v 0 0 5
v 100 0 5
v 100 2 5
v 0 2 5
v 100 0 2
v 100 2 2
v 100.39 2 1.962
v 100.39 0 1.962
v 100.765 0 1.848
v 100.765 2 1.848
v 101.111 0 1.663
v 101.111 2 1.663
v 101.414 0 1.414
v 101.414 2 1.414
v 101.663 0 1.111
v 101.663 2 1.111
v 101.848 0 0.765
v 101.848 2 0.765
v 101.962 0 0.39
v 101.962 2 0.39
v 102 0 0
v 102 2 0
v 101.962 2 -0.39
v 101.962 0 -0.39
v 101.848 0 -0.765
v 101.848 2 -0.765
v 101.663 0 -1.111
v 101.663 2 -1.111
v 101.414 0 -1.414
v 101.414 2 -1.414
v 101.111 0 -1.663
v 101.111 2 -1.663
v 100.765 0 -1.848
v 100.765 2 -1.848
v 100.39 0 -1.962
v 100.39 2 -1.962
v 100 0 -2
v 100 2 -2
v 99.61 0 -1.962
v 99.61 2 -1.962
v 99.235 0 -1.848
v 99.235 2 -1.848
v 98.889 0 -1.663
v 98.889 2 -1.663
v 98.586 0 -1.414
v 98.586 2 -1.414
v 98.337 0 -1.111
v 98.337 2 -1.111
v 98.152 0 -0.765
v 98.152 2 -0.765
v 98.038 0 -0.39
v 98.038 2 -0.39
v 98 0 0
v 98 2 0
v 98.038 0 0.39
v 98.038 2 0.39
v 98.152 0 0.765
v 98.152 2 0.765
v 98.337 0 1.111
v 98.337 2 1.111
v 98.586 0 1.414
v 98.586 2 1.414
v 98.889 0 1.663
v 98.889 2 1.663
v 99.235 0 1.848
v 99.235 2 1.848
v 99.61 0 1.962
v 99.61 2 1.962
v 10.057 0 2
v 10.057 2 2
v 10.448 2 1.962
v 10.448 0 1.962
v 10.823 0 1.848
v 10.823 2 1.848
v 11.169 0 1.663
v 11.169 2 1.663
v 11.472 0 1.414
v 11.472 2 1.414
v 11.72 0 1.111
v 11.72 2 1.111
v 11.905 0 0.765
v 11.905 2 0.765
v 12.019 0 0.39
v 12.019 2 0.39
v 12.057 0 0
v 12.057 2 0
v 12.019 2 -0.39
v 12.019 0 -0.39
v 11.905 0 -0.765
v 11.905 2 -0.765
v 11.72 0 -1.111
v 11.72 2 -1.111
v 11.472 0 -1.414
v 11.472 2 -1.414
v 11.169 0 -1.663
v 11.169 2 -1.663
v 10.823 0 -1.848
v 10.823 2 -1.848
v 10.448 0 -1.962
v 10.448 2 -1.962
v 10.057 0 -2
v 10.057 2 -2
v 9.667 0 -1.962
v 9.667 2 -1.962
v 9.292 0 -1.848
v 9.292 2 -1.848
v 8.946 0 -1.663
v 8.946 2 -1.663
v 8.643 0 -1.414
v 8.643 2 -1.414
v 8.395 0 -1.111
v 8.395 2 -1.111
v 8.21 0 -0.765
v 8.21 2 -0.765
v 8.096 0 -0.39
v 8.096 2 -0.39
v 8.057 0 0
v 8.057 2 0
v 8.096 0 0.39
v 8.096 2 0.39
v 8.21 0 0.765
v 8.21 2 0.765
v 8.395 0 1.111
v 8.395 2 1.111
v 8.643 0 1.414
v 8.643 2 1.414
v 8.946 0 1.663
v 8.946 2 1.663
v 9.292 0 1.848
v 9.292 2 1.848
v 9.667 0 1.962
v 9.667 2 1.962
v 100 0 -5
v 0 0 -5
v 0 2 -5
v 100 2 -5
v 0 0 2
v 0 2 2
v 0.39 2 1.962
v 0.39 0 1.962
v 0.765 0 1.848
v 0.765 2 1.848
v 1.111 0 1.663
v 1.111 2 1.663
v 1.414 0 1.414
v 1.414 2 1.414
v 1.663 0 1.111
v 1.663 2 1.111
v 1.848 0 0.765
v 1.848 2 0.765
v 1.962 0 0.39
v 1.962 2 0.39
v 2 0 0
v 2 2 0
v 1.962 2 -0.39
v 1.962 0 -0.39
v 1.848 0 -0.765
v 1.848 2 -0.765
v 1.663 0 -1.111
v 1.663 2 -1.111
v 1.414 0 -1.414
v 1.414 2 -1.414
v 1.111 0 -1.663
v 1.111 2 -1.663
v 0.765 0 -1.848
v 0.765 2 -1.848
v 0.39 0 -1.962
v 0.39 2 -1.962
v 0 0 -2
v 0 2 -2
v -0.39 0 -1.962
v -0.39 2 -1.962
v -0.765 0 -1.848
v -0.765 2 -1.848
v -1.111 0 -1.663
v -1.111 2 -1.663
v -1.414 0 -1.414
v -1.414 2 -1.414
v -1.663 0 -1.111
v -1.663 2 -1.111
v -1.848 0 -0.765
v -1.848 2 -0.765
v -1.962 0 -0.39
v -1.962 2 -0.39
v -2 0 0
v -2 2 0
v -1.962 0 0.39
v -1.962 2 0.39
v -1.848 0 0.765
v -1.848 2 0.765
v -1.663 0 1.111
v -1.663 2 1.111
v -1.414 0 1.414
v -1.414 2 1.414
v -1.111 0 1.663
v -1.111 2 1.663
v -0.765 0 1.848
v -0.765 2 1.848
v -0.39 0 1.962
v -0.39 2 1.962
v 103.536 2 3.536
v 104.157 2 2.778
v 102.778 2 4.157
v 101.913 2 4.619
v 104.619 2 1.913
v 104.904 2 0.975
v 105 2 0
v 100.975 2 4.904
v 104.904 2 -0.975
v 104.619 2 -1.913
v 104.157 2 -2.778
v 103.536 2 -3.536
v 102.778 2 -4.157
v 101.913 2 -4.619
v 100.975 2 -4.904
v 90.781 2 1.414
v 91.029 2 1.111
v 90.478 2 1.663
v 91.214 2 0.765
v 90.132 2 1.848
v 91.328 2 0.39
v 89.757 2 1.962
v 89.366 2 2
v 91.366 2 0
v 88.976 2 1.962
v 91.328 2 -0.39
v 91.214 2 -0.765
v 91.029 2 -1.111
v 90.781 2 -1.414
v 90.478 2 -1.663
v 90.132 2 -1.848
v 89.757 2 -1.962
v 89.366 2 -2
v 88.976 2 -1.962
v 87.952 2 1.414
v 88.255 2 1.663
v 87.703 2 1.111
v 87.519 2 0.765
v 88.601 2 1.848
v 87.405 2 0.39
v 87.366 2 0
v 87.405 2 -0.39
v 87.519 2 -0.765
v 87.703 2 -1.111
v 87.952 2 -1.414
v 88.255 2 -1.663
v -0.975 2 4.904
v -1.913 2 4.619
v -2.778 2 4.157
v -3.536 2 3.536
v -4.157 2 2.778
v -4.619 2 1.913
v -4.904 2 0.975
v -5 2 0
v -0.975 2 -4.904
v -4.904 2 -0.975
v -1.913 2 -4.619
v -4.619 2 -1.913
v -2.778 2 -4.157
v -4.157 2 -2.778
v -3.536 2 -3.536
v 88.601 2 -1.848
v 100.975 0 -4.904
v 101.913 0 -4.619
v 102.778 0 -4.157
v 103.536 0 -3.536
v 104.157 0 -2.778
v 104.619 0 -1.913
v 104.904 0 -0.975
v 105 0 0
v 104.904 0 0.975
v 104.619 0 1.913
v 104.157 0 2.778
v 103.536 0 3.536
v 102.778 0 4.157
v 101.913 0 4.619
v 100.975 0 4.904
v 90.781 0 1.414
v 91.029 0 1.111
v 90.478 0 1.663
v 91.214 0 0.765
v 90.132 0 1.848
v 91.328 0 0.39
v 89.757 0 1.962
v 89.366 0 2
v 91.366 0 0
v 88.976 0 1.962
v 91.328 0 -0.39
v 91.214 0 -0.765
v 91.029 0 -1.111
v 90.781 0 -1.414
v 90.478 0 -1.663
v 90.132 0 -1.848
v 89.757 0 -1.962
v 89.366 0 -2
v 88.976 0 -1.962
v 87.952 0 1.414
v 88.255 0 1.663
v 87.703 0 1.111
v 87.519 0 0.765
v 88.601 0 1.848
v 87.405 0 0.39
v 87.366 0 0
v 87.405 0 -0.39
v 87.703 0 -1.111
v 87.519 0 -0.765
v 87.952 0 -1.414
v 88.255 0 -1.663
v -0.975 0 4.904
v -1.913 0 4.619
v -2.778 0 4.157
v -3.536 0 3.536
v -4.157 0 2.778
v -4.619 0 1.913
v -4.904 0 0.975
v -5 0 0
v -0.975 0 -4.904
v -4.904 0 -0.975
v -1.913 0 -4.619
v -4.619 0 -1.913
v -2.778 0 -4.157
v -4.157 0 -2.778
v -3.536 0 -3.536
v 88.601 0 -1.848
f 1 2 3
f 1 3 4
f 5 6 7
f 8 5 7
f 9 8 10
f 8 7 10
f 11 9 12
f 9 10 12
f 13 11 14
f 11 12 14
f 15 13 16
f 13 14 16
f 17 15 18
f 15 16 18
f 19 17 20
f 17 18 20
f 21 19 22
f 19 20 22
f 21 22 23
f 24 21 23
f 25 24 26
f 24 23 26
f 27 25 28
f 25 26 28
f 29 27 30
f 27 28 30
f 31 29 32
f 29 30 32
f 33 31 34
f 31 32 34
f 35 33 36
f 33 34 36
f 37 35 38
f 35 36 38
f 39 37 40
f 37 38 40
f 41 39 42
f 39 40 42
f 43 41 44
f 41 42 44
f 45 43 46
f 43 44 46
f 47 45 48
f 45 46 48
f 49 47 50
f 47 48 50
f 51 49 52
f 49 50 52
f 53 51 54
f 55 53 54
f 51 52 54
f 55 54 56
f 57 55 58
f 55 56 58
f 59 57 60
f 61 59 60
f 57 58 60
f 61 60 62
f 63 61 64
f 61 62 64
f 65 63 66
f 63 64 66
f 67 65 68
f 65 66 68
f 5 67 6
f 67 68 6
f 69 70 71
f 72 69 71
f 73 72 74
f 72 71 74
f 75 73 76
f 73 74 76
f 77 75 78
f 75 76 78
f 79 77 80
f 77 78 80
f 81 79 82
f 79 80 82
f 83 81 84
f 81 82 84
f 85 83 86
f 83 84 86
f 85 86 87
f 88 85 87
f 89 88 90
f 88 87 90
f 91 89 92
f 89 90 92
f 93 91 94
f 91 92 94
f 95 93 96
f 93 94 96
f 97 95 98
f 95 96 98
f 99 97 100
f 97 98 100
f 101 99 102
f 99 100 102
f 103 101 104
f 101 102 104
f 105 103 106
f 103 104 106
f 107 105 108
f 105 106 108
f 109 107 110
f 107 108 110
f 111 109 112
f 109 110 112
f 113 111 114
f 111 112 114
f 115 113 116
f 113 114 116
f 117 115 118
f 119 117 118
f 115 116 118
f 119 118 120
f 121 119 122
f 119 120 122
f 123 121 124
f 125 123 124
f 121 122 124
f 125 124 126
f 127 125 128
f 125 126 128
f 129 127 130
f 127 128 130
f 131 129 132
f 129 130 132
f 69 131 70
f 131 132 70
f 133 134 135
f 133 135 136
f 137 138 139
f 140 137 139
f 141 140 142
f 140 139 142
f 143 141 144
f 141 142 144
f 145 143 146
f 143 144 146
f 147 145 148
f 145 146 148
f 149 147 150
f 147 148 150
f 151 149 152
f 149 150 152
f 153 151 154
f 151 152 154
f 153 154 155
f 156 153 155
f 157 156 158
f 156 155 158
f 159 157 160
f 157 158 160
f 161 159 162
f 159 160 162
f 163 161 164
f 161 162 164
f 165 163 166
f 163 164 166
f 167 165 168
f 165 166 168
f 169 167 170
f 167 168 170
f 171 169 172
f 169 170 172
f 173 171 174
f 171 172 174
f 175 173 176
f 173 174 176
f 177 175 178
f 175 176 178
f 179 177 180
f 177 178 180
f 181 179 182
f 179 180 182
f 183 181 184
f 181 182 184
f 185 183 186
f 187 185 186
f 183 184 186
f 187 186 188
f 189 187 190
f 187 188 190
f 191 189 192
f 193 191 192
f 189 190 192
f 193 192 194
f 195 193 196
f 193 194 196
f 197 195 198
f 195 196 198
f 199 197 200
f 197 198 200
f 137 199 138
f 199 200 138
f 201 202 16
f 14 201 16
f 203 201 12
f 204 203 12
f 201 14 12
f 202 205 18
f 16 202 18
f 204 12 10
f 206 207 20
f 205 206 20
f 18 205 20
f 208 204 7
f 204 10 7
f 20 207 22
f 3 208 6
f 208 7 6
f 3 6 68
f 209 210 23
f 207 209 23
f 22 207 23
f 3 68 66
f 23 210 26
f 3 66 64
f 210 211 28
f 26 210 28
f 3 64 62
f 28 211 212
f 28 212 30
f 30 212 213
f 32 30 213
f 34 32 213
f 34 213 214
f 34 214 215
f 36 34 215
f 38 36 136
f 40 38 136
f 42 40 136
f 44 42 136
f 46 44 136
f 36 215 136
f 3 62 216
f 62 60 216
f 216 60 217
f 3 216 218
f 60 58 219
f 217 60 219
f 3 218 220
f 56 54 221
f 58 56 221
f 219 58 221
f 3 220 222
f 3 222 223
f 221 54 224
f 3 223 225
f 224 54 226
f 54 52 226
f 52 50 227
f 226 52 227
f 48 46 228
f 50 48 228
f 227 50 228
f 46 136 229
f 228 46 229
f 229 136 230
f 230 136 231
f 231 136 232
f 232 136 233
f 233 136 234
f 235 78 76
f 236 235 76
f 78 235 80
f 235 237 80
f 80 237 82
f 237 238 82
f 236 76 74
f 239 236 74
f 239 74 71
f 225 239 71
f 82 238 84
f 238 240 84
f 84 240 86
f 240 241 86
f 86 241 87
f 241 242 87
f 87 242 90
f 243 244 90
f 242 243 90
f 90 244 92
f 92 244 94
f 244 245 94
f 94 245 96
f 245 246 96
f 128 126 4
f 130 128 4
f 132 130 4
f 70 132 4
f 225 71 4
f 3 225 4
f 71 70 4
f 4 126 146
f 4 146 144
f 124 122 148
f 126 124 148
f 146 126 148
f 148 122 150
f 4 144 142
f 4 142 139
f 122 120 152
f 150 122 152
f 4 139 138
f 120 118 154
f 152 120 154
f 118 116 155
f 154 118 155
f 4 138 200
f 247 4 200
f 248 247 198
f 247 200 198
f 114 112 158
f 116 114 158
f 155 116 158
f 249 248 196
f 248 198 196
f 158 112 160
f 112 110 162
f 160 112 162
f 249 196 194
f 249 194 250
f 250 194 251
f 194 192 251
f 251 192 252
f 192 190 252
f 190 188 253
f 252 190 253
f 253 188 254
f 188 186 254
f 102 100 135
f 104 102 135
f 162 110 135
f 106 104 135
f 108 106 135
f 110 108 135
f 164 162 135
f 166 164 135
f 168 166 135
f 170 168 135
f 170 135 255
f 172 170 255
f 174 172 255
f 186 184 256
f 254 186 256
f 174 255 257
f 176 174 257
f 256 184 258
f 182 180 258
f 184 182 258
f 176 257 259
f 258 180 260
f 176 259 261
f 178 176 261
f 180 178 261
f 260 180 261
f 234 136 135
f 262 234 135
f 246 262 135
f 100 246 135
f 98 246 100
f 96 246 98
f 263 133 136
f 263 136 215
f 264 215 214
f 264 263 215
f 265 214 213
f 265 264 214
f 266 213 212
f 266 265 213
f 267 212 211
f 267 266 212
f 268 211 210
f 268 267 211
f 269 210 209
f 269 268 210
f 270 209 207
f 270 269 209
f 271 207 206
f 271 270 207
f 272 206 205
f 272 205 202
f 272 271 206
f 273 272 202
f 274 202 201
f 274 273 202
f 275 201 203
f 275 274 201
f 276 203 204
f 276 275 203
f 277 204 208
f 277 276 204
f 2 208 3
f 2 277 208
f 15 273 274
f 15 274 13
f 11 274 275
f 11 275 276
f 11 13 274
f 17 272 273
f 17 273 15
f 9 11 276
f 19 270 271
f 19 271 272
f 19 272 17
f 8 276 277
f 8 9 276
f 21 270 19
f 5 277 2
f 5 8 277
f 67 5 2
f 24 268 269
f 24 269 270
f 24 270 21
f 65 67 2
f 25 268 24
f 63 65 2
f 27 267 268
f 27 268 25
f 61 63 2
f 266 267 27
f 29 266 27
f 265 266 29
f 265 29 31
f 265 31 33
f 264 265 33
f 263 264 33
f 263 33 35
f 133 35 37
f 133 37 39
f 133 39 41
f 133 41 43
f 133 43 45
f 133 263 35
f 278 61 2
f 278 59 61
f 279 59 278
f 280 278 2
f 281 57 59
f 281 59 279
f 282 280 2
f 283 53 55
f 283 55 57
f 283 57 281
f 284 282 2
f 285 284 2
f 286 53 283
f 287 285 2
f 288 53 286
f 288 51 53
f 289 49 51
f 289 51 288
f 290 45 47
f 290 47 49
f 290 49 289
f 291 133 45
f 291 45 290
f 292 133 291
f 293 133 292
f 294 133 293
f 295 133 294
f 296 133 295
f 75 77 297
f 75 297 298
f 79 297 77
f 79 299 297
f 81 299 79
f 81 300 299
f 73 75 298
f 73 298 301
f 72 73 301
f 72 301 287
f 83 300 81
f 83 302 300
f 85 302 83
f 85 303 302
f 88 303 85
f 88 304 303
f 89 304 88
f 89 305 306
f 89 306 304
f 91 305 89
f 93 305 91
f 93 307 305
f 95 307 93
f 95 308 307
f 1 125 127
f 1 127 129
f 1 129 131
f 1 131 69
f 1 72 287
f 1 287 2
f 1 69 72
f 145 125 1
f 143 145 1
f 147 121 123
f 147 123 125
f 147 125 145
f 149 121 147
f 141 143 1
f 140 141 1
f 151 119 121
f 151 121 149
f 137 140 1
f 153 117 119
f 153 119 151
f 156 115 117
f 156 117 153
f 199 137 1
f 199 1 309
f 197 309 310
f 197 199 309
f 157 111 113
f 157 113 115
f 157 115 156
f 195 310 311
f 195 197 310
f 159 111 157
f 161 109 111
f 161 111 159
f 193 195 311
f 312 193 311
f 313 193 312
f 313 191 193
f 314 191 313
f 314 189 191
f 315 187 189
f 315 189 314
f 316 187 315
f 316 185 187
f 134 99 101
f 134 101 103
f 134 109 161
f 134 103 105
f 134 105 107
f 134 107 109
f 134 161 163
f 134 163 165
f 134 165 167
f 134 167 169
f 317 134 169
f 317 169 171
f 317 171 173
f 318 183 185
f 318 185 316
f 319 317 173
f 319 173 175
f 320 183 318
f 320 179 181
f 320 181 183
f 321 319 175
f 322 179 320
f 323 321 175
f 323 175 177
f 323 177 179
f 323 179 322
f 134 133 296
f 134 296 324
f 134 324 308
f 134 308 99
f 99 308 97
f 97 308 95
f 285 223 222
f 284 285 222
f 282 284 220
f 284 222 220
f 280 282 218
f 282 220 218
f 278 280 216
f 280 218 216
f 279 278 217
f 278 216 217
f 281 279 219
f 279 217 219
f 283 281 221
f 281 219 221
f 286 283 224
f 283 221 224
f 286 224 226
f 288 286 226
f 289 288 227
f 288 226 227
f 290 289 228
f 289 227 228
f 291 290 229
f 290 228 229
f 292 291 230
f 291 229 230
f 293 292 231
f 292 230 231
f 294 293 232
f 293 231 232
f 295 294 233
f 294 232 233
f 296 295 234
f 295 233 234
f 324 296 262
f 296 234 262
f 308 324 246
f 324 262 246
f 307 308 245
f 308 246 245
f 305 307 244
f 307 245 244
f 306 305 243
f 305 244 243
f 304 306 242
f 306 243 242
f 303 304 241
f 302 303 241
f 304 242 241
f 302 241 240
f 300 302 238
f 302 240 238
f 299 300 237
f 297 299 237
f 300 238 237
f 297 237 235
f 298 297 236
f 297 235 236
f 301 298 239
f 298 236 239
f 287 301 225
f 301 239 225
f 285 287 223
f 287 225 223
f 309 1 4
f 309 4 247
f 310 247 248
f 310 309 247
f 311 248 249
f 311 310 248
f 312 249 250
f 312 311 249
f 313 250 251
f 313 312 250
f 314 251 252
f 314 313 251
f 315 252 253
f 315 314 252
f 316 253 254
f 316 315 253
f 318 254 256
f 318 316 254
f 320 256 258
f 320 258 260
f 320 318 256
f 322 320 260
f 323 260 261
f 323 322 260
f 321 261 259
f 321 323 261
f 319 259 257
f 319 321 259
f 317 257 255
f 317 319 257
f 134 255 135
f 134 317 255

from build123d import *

# Parameters (mm, degrees)
SKETCH_1_R          = 2.3
EXTRUDE_1_DEPTH     = 2
SKETCH_2_R          = 2.445702399
SKETCH_2_R_2        = 2
EXTRUDE_2_DEPTH     = 2
SKETCH_3_R          = 2.726249273
SKETCH_3_R_2        = 2
EXTRUDE_3_DEPTH     = 2
SKETCH_4_R          = 2
CUT_EXTRUDE_1_DEPTH = 2


with BuildPart() as part:
    # 草图1 → 凸台-拉伸1 (new body)
    with BuildSketch(Plane(origin=(0, 0, 0), x_dir=(1, 0, 0), z_dir=(0, 1, 0))):
        with BuildLine():
            Line((0, 5), (100, 5))
            ThreePointArc((100, 5), (105, 0), (100, -5))
            Line((100, -5), (0, -5))
            ThreePointArc((0, -5), (-5, 0), (0, 5))
        make_face()
        with Locations(Location((0, 0, 0), (0, 0, 270))):
            Circle(SKETCH_1_R, mode=Mode.SUBTRACT)
        with Locations(Location((100, 0, 0), (0, 0, 270))):
            Circle(SKETCH_1_R, mode=Mode.SUBTRACT)
    extrude(amount=EXTRUDE_1_DEPTH)

    # 草图2 → 凸台-拉伸2 (add)
    with BuildSketch(Plane(origin=(0, 2, 0), x_dir=(1, 0, 0), z_dir=(0, 1, 0))):
        Circle(SKETCH_2_R)
        with Locations(Location((0, 0, 0), (0, 0, 270))):
            Circle(SKETCH_2_R_2, mode=Mode.SUBTRACT)
    extrude(amount=-EXTRUDE_2_DEPTH)

    # 草图3 → 凸台-拉伸3 (add)
    with BuildSketch(Plane(origin=(0, 2, 0), x_dir=(1, 0, 0), z_dir=(0, 1, 0))):
        with Locations((100, 0)):
            Circle(SKETCH_3_R)
        with Locations(Location((100, 0, 0), (0, 0, 270))):
            Circle(SKETCH_3_R_2, mode=Mode.SUBTRACT)
    extrude(amount=-EXTRUDE_3_DEPTH)

    # 草图4 → 切除-拉伸1 (cut)
    with BuildSketch(Plane(origin=(0, 2, 0), x_dir=(1, 0, 0), z_dir=(0, 1, 0))):
        with Locations(Location((10.057445081, 0, 0), (0, 0, 270))):
            Circle(SKETCH_4_R)
        with Locations(Location((89.366430164, 0, 0), (0, 0, 270))):
            Circle(SKETCH_4_R)
    extrude(amount=-CUT_EXTRUDE_1_DEPTH, mode=Mode.SUBTRACT)


solid = part.part
